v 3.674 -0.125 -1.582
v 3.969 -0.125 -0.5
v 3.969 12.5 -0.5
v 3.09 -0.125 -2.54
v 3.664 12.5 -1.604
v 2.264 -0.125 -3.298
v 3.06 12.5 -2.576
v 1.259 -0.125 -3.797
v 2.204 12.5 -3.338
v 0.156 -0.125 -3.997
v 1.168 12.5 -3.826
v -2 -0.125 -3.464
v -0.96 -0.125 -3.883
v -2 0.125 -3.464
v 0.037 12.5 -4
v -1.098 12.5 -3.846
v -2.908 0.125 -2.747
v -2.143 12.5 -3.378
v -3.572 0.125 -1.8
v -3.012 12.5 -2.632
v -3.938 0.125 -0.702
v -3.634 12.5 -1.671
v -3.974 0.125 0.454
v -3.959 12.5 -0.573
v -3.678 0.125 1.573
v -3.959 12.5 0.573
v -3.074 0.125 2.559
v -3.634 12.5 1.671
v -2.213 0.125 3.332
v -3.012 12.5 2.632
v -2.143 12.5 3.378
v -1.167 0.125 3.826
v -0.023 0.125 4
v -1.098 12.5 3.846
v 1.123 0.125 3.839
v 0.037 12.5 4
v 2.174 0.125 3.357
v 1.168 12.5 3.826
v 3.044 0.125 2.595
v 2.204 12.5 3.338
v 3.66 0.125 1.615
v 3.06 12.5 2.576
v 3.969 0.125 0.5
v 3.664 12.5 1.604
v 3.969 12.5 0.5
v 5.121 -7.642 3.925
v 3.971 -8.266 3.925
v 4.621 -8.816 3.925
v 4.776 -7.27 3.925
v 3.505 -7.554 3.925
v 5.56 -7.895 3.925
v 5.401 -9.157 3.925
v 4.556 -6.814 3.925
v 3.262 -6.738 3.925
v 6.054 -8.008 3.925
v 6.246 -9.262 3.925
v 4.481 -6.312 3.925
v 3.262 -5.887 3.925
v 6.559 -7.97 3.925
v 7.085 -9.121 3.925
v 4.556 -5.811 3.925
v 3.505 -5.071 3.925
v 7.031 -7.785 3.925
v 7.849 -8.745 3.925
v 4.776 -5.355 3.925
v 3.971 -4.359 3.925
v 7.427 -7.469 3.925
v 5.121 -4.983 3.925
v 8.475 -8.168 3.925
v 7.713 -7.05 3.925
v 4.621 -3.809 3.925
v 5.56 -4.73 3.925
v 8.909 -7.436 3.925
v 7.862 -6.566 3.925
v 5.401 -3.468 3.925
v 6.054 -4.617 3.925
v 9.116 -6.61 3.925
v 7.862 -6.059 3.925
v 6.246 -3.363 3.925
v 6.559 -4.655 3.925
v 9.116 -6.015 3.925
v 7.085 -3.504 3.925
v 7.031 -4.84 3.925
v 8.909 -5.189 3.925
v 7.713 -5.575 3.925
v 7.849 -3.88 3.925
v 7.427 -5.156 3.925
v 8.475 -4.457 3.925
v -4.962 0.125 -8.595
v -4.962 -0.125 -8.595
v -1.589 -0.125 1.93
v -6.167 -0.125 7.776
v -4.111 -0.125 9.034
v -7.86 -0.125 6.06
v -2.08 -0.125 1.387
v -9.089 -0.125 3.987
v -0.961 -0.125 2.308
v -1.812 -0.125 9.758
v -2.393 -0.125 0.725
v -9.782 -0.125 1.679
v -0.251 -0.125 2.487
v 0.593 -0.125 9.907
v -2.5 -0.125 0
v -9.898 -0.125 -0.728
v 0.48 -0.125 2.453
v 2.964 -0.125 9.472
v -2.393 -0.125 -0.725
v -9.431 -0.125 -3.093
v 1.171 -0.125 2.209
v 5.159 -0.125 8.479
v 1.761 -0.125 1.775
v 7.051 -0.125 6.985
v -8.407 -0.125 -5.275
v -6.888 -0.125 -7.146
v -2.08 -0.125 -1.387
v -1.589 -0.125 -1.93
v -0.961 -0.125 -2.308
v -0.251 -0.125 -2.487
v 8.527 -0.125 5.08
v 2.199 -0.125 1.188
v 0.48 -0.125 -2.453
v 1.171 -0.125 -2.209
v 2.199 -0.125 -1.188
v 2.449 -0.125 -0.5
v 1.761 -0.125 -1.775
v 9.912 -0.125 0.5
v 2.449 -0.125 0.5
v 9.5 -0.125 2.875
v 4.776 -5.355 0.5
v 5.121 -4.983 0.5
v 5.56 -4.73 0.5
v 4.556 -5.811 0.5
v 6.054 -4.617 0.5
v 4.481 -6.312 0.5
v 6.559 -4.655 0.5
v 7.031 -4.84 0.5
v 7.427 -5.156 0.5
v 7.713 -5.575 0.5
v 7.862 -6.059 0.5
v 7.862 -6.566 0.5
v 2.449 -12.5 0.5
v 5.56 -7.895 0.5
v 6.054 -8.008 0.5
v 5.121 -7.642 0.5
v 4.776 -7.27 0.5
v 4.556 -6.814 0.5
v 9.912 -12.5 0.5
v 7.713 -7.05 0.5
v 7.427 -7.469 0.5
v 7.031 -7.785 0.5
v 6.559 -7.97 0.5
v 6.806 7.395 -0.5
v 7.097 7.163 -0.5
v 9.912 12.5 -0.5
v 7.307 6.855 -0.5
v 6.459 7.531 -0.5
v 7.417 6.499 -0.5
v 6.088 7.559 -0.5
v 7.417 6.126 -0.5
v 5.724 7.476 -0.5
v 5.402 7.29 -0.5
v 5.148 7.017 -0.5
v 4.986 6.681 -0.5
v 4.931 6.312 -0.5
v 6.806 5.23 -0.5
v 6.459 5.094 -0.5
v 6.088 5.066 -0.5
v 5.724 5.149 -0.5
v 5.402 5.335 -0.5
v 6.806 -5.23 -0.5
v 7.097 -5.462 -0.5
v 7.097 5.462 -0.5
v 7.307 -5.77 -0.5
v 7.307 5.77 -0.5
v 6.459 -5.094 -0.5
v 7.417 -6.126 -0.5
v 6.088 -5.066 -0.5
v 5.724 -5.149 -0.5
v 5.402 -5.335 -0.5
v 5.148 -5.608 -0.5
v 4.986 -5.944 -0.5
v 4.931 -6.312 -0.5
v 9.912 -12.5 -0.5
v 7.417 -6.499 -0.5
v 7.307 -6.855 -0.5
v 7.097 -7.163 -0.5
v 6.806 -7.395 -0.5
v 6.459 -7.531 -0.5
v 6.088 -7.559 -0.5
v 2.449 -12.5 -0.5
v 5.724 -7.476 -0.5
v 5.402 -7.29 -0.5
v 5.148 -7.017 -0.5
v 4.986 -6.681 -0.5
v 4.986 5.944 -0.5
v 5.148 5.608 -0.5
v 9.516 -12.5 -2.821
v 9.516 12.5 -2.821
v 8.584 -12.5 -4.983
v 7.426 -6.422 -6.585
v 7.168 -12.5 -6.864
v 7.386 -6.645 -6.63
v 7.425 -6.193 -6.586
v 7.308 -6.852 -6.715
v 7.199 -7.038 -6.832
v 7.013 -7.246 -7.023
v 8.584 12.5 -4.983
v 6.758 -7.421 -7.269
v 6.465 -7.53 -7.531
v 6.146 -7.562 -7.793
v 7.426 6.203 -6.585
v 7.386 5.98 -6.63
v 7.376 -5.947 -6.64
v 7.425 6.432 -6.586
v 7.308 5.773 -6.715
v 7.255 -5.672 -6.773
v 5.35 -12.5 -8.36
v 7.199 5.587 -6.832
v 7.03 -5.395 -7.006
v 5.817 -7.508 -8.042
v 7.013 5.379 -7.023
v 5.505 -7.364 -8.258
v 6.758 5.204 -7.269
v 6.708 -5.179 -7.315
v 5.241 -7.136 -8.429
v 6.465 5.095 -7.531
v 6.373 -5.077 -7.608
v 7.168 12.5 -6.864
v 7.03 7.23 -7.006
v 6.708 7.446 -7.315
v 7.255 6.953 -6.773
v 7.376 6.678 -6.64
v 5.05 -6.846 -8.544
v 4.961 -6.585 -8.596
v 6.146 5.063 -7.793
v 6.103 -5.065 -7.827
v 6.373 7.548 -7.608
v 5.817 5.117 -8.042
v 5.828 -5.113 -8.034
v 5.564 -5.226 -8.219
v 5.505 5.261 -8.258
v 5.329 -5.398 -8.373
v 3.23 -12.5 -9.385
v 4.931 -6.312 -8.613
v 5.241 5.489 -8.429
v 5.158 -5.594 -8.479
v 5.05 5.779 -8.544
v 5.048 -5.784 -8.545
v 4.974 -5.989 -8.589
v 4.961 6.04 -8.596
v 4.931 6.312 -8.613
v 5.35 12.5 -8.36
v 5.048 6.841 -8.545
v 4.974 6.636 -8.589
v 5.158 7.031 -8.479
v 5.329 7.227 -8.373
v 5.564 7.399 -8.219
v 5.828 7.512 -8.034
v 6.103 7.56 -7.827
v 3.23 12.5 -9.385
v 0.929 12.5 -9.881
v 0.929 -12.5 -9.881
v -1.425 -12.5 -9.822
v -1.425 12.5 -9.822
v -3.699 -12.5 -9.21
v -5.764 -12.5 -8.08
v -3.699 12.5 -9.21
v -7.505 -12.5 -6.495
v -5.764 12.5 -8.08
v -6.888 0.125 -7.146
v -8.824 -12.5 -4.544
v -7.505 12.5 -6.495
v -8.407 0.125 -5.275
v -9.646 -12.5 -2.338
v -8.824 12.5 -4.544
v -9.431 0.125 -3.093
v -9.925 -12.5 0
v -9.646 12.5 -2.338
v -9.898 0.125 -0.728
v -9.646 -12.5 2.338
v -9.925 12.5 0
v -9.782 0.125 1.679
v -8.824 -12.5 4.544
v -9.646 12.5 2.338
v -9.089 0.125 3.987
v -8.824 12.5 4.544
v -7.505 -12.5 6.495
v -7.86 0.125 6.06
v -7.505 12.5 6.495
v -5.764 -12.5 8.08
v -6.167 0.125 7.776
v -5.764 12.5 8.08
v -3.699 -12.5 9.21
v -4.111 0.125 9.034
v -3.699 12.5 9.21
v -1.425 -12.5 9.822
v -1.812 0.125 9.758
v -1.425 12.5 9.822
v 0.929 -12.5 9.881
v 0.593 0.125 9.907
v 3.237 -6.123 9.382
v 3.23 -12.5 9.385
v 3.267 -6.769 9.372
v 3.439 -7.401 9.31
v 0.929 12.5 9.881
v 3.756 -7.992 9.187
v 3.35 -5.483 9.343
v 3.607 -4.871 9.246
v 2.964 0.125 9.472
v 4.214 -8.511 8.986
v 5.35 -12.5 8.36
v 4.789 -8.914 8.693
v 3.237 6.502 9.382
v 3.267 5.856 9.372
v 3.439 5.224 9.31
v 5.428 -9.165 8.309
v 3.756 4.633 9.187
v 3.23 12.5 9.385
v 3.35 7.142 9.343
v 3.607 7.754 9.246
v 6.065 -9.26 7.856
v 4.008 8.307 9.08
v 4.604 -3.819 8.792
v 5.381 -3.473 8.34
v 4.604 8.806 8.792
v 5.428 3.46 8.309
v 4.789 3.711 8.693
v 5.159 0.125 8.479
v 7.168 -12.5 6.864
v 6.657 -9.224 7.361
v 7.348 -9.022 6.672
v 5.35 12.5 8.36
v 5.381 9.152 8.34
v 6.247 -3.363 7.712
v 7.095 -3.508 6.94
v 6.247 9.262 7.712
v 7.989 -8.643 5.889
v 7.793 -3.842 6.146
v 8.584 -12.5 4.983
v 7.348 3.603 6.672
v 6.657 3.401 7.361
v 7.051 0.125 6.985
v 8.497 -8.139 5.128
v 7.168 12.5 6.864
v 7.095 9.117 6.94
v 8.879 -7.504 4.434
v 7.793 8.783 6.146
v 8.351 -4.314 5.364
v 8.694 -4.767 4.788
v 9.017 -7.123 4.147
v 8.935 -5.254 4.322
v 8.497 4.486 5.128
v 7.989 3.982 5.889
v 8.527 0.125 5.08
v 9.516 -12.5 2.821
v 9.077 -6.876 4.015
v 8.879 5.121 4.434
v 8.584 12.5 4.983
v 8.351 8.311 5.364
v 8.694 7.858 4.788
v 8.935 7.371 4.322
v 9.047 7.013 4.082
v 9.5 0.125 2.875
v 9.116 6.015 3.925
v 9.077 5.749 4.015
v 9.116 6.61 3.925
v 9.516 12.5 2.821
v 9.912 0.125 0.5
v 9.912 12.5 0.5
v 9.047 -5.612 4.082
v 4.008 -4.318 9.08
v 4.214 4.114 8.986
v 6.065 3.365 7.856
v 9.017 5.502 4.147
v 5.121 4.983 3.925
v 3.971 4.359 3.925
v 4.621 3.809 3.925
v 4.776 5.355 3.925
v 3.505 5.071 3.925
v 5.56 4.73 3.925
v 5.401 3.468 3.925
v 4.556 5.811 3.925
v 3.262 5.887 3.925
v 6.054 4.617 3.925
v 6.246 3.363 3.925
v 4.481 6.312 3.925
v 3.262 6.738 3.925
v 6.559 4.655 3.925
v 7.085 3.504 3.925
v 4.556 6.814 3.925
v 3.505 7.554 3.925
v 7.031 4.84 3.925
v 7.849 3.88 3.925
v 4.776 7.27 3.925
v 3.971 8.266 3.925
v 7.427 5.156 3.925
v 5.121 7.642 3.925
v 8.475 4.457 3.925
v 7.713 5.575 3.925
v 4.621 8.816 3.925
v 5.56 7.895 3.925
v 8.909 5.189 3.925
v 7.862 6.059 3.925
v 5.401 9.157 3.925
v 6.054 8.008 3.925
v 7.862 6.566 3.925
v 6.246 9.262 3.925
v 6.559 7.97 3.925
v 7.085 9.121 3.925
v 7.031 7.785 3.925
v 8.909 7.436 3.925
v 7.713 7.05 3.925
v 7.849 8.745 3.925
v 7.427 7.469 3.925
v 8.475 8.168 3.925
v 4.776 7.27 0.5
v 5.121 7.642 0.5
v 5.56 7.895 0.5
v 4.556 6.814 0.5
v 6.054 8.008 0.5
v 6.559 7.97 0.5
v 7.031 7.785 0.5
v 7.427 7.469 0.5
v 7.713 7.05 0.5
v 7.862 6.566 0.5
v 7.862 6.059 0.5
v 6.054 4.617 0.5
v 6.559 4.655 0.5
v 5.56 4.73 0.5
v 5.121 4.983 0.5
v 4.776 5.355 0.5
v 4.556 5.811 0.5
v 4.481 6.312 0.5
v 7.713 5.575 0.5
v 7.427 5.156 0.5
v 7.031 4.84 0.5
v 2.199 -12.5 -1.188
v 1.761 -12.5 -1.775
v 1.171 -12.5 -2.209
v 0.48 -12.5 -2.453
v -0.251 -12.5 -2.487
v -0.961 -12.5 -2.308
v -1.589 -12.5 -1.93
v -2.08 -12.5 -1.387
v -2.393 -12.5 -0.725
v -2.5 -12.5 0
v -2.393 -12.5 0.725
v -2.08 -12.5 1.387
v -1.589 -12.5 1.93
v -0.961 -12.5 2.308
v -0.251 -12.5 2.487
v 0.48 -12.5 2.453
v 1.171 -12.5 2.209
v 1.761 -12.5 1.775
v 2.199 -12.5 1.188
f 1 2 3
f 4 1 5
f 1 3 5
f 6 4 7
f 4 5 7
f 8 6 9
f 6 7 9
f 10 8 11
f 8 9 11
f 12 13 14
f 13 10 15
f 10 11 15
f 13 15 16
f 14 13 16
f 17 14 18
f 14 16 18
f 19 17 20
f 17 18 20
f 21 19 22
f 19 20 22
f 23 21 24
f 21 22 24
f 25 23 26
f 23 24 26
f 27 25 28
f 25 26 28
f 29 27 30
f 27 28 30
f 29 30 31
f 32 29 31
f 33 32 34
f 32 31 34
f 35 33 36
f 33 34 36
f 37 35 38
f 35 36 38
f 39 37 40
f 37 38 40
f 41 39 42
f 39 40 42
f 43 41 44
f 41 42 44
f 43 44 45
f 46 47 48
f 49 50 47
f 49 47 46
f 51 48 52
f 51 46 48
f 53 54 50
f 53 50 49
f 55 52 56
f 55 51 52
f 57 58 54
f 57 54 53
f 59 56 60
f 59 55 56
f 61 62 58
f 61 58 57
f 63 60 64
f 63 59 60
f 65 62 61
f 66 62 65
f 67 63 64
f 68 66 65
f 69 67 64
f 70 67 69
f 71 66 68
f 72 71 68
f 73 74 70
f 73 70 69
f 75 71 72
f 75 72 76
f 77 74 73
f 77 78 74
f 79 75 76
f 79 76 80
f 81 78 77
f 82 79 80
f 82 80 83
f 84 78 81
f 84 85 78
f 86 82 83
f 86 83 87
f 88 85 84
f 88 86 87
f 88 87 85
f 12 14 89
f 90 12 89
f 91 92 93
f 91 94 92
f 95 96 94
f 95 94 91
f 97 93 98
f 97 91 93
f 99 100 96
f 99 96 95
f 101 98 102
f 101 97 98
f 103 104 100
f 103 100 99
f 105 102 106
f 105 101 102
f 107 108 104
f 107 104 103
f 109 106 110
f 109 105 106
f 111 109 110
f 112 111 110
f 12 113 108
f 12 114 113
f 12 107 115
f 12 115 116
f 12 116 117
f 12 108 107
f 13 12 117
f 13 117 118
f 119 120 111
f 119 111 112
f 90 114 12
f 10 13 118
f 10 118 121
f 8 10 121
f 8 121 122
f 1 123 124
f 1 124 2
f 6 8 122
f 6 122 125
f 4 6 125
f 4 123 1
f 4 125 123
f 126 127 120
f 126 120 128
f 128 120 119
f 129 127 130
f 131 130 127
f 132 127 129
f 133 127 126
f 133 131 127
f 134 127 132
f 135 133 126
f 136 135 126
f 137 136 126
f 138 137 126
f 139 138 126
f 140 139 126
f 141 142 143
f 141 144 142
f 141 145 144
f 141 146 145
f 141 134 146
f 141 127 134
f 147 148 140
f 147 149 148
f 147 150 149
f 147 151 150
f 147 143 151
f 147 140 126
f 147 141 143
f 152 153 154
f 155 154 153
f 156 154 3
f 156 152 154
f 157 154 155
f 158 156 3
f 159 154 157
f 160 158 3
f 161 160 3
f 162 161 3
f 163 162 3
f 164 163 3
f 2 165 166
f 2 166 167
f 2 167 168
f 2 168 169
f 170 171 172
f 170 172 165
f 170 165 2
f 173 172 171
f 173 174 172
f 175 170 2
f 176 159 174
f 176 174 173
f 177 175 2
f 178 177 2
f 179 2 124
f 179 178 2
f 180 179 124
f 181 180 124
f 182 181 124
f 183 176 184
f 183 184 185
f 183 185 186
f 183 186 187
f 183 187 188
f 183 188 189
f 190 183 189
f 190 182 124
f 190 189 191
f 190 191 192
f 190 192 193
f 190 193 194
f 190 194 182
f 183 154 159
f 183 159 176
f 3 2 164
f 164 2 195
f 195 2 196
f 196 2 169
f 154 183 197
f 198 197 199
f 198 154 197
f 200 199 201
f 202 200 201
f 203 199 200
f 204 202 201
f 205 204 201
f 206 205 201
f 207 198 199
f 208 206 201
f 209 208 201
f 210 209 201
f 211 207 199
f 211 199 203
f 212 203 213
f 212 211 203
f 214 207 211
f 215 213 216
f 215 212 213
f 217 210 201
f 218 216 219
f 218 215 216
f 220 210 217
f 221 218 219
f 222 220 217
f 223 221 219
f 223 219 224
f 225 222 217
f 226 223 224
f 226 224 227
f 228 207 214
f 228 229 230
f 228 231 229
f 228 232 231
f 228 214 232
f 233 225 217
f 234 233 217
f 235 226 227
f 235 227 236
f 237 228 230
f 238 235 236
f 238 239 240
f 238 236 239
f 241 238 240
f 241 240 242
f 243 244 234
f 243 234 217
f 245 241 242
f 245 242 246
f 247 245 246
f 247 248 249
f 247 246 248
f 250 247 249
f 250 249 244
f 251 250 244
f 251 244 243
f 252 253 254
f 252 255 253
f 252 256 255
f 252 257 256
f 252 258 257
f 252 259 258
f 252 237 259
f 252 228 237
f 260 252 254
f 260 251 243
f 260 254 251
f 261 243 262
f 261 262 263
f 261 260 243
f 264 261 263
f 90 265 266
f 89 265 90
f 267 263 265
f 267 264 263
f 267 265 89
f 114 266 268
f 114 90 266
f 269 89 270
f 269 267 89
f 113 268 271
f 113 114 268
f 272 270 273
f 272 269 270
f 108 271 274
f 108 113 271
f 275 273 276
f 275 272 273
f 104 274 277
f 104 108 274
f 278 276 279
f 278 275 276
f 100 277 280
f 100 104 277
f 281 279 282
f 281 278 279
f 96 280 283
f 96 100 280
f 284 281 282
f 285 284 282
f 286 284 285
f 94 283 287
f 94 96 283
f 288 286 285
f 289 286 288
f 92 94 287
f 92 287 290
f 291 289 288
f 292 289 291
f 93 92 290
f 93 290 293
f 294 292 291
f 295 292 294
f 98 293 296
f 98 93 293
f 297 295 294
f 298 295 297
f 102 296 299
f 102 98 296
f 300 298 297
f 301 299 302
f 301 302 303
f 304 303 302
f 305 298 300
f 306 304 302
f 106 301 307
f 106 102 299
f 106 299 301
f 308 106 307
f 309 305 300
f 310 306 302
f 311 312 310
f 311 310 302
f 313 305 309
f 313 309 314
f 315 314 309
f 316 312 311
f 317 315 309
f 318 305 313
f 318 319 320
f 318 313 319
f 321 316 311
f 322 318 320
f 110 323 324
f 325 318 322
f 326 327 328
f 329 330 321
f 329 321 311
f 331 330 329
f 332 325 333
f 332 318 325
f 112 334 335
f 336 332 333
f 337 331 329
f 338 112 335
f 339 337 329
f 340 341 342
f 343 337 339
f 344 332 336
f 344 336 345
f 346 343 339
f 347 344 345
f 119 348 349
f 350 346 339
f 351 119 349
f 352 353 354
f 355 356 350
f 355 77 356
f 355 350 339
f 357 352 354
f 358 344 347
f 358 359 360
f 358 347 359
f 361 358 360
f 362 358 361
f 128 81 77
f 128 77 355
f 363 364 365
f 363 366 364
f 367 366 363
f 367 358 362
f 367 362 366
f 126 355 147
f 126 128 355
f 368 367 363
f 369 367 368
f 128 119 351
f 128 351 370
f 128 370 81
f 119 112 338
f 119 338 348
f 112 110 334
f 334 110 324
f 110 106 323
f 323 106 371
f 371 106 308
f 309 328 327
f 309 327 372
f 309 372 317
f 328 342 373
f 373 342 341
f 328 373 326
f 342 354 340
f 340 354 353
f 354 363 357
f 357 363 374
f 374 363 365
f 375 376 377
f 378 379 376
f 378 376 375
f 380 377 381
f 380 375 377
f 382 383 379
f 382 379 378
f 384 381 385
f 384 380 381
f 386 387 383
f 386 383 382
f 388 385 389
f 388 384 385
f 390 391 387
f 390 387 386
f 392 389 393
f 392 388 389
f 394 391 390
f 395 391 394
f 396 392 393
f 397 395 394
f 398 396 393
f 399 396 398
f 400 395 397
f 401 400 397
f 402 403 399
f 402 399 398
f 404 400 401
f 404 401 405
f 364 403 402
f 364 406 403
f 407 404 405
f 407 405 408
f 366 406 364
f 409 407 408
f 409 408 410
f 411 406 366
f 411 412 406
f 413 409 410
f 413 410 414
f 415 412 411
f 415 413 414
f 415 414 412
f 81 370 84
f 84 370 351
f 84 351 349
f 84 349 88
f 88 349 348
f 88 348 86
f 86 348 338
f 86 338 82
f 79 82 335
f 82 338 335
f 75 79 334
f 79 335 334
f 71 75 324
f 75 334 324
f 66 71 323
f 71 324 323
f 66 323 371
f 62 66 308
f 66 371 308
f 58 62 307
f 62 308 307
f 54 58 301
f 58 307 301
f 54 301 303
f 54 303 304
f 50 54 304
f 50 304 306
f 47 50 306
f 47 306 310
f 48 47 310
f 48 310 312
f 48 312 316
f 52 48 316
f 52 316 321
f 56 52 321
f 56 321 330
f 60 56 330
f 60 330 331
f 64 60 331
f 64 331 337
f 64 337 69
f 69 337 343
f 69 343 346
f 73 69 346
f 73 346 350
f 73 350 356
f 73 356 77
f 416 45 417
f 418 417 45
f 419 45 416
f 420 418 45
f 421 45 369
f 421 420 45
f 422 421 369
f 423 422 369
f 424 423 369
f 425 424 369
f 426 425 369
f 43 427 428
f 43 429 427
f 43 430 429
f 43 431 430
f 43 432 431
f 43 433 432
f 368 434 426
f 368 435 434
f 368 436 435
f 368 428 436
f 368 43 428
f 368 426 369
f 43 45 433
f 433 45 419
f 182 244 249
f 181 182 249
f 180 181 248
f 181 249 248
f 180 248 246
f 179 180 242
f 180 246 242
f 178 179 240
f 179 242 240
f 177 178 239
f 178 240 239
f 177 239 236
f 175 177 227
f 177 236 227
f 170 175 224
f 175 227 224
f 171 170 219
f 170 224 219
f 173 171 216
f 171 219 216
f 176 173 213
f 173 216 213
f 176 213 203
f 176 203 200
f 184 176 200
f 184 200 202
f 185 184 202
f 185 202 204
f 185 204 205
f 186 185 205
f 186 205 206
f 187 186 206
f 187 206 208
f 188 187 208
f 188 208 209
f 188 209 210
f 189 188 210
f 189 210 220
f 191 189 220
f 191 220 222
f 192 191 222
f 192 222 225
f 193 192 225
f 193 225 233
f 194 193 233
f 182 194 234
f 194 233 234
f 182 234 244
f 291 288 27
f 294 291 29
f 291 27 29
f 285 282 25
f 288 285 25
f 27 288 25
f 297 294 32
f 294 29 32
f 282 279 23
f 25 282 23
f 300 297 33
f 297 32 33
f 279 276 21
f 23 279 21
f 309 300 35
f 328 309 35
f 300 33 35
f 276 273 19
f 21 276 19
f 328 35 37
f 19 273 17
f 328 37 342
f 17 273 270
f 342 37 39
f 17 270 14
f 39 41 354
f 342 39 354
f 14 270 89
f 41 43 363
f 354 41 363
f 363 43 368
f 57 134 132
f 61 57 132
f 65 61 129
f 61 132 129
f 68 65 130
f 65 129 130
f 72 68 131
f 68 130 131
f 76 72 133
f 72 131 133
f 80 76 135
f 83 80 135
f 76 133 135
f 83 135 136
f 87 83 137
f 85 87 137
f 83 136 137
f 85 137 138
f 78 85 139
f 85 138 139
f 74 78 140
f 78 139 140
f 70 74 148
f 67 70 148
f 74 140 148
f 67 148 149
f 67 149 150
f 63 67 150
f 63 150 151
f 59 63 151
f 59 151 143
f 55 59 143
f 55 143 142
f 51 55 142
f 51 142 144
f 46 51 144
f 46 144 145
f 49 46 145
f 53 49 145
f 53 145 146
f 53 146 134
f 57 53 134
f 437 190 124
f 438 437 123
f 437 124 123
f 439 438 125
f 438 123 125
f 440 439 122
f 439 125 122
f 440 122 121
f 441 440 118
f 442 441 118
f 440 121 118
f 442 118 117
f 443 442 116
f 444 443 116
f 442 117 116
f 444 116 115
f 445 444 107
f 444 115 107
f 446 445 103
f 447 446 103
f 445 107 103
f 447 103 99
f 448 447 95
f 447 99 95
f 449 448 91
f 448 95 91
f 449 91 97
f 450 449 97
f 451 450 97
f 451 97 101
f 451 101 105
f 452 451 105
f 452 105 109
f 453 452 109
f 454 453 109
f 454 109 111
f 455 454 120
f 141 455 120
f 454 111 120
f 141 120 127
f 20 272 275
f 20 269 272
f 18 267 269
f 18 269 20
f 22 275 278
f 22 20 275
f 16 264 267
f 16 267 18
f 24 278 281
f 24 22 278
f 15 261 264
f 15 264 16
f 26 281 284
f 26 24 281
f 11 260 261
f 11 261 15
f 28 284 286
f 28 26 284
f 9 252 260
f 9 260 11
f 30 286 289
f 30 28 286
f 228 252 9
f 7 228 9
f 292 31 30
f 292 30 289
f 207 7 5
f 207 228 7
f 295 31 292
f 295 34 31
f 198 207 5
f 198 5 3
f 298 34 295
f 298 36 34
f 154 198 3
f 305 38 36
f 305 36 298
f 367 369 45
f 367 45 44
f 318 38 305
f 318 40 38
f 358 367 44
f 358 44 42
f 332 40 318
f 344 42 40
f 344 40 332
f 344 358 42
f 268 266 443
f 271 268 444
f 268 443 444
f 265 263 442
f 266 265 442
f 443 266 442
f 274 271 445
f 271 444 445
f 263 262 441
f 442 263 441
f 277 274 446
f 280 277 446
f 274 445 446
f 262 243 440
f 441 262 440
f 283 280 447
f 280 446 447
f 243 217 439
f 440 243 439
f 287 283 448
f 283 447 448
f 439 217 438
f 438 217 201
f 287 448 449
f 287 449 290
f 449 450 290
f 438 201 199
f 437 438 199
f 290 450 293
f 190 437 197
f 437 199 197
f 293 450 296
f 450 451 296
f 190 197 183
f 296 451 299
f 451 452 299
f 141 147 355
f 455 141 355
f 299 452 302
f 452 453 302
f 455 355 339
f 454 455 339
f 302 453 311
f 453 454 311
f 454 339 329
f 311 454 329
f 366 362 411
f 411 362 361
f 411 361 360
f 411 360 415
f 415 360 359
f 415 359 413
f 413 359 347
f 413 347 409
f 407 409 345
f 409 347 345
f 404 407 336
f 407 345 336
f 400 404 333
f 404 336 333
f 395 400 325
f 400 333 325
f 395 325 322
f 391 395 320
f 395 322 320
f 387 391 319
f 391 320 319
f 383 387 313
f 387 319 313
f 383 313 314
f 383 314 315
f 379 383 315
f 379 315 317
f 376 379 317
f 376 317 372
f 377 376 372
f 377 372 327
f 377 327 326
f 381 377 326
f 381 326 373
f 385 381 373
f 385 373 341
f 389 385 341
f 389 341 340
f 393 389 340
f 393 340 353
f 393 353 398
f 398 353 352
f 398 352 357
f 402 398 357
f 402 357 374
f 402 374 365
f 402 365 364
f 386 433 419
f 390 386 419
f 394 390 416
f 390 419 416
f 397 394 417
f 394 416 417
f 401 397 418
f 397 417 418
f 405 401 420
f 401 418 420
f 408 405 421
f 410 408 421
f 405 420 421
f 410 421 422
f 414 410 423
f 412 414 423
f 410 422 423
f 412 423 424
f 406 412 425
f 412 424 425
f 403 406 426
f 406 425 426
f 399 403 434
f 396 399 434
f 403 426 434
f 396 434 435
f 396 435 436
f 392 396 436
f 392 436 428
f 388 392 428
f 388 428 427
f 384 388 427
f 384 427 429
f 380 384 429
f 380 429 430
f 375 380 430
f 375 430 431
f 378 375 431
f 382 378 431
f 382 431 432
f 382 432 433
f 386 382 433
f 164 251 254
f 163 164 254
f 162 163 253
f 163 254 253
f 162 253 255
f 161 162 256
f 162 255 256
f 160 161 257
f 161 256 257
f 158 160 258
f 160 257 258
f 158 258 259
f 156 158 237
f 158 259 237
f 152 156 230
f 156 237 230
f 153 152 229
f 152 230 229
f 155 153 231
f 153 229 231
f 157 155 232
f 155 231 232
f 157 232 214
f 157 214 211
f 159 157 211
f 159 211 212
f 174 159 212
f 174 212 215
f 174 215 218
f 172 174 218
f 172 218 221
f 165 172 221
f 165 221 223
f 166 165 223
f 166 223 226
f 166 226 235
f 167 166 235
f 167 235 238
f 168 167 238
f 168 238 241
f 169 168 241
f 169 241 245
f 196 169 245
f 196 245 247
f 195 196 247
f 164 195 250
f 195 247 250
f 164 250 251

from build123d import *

# Parameters (mm, degrees)
SKETCH1_R                      = 9.925
BOSS_EXTRUDE1_DEPTH            = 12.5
CUT_EXTRUDE5_DEPTH             = 0.125
CUT_EXTRUDE1_REACH             = 30.671
SKETCH3_R                      = 4
SKETCH4_R                      = 2.5
CUT_EXTRUDE2_DEPTH             = 19.878608927
CUT_EXTRUDE6_DEPTH             = 19.795245409
CUT_EXTRUDE6_DEPTH_BACK        = 19.795245409
CBORE_FOR_M3_SHCS1_D           = 3.4
CBORE_FOR_M3_SHCS1_DEPTH       = 9.425
CBORE_FOR_M3_SHCS1_CBORE_D     = 5.9
CBORE_FOR_M3_SHCS1_CBORE_DEPTH = 6
M3X0_5_TAPPED_HOLE1_D          = 2.5


with BuildPart() as part:
    # Sketch1 → Boss-Extrude1 (new, symmetric)
    with BuildSketch(Plane(origin=(0, 0, 0), x_dir=(1, 0, 0), z_dir=(0, 1, 0))):
        with Locations(Location((0, 0, 0), (0, 0, 270))):
            Circle(SKETCH1_R)
    extrude(amount=BOSS_EXTRUDE1_DEPTH, both=True)

    # Sketch10 → Cut-Extrude5 (cut, symmetric)
    with BuildSketch(Plane(origin=(0, 0, 0), x_dir=(1, 0, 0), z_dir=(0, 1, 0))):
        with BuildLine():
            Line((0, -0.5), (0, 0))
            Line((0, 0), (-0.288675135, 0.5))
            Line((-0.288675135, 0.5), (-4.9625, 8.595302133))
            ThreePointArc((-4.9625, 8.595302133), (-5.177499554, -8.467533488), (9.91239754, -0.5))
            Line((9.91239754, -0.5), (0, -0.5))
        make_face()
    extrude(amount=CUT_EXTRUDE5_DEPTH, both=True, mode=Mode.SUBTRACT)

    # Cut-Extrude1: up to this face of the body (flat: up to its plane)
    cut_extrude1_end = Plane(part.part.faces().sort_by_distance((-1.523889636, -0.125, 2.421634097))[0])
    # Sketch3 → Cut-Extrude1 (cut, up to the picked face)
    with BuildSketch(Plane(origin=(0, 12.5, 0), x_dir=(1, 0, 0), z_dir=(0, 1, 0)), mode=Mode.PRIVATE) as cut_extrude1_sk1:
        with Locations(Location((0, 0, 0), (0, 0, 270))):
            Circle(SKETCH3_R)
    cut_extrude1_tool1 = split(extrude(cut_extrude1_sk1.sketch, amount=-CUT_EXTRUDE1_REACH, mode=Mode.PRIVATE), bisect_by=cut_extrude1_end, keep=Keep.BOTH, mode=Mode.PRIVATE)
    add(cut_extrude1_tool1.solids().sort_by(Axis((0, 12.5, 0), (0, -1, 0)))[0], mode=Mode.SUBTRACT)

    # Sketch4 → Cut-Extrude2 (cut, through all)
    with BuildSketch(Plane(origin=(0, -0.125, 0), x_dir=(1, 0, 0), z_dir=(0, 1, 0))):
        with Locations(Location((0, 0, 0), (0, 0, 270))):
            Circle(SKETCH4_R)
    extrude(amount=-CUT_EXTRUDE2_DEPTH, mode=Mode.SUBTRACT)

    # Sketch10<4> → Cut-Extrude6 (cut, two sides: drawn at the far end of the back side and taken through both)
    with BuildSketch(Plane(origin=(0, 0, 0), x_dir=(1, 0, 0), z_dir=(0, 1, 0)).offset(-CUT_EXTRUDE6_DEPTH_BACK)):
        with BuildLine():
            Line((-0.288675135, 0.5), (0, 0))
            Line((0, 0), (0, -0.5))
            Line((0, -0.5), (9.91239754, -0.5))
            ThreePointArc((9.91239754, -0.5), (9.921848885, -0.250079398), (9.925, 0))
            ThreePointArc((9.925, 0), (9.921848885, 0.250079398), (9.91239754, 0.5))
            Line((9.91239754, 0.5), (0, 0.5))
            Line((0, 0.5), (-0.288675135, 0.5))
        make_face()
    extrude(amount=CUT_EXTRUDE6_DEPTH + CUT_EXTRUDE6_DEPTH_BACK, mode=Mode.SUBTRACT)

    # CBORE for M3 SHCS1
    with Locations(Plane.XY.offset(9.925)):
        with Locations((6.180943642, -6.3125), (6.180943642, 6.3125)):
            CounterBoreHole(CBORE_FOR_M3_SHCS1_D / 2, CBORE_FOR_M3_SHCS1_CBORE_D / 2, CBORE_FOR_M3_SHCS1_CBORE_DEPTH, depth=CBORE_FOR_M3_SHCS1_DEPTH)

    # M3x0.5 Tapped Hole1 (through all)
    with Locations(Plane.XY.offset(-0.5)):
        with Locations((6.180943642, 6.3125), (6.180943642, -6.3125)):
            Hole(M3X0_5_TAPPED_HOLE1_D / 2)


solid = part.part
